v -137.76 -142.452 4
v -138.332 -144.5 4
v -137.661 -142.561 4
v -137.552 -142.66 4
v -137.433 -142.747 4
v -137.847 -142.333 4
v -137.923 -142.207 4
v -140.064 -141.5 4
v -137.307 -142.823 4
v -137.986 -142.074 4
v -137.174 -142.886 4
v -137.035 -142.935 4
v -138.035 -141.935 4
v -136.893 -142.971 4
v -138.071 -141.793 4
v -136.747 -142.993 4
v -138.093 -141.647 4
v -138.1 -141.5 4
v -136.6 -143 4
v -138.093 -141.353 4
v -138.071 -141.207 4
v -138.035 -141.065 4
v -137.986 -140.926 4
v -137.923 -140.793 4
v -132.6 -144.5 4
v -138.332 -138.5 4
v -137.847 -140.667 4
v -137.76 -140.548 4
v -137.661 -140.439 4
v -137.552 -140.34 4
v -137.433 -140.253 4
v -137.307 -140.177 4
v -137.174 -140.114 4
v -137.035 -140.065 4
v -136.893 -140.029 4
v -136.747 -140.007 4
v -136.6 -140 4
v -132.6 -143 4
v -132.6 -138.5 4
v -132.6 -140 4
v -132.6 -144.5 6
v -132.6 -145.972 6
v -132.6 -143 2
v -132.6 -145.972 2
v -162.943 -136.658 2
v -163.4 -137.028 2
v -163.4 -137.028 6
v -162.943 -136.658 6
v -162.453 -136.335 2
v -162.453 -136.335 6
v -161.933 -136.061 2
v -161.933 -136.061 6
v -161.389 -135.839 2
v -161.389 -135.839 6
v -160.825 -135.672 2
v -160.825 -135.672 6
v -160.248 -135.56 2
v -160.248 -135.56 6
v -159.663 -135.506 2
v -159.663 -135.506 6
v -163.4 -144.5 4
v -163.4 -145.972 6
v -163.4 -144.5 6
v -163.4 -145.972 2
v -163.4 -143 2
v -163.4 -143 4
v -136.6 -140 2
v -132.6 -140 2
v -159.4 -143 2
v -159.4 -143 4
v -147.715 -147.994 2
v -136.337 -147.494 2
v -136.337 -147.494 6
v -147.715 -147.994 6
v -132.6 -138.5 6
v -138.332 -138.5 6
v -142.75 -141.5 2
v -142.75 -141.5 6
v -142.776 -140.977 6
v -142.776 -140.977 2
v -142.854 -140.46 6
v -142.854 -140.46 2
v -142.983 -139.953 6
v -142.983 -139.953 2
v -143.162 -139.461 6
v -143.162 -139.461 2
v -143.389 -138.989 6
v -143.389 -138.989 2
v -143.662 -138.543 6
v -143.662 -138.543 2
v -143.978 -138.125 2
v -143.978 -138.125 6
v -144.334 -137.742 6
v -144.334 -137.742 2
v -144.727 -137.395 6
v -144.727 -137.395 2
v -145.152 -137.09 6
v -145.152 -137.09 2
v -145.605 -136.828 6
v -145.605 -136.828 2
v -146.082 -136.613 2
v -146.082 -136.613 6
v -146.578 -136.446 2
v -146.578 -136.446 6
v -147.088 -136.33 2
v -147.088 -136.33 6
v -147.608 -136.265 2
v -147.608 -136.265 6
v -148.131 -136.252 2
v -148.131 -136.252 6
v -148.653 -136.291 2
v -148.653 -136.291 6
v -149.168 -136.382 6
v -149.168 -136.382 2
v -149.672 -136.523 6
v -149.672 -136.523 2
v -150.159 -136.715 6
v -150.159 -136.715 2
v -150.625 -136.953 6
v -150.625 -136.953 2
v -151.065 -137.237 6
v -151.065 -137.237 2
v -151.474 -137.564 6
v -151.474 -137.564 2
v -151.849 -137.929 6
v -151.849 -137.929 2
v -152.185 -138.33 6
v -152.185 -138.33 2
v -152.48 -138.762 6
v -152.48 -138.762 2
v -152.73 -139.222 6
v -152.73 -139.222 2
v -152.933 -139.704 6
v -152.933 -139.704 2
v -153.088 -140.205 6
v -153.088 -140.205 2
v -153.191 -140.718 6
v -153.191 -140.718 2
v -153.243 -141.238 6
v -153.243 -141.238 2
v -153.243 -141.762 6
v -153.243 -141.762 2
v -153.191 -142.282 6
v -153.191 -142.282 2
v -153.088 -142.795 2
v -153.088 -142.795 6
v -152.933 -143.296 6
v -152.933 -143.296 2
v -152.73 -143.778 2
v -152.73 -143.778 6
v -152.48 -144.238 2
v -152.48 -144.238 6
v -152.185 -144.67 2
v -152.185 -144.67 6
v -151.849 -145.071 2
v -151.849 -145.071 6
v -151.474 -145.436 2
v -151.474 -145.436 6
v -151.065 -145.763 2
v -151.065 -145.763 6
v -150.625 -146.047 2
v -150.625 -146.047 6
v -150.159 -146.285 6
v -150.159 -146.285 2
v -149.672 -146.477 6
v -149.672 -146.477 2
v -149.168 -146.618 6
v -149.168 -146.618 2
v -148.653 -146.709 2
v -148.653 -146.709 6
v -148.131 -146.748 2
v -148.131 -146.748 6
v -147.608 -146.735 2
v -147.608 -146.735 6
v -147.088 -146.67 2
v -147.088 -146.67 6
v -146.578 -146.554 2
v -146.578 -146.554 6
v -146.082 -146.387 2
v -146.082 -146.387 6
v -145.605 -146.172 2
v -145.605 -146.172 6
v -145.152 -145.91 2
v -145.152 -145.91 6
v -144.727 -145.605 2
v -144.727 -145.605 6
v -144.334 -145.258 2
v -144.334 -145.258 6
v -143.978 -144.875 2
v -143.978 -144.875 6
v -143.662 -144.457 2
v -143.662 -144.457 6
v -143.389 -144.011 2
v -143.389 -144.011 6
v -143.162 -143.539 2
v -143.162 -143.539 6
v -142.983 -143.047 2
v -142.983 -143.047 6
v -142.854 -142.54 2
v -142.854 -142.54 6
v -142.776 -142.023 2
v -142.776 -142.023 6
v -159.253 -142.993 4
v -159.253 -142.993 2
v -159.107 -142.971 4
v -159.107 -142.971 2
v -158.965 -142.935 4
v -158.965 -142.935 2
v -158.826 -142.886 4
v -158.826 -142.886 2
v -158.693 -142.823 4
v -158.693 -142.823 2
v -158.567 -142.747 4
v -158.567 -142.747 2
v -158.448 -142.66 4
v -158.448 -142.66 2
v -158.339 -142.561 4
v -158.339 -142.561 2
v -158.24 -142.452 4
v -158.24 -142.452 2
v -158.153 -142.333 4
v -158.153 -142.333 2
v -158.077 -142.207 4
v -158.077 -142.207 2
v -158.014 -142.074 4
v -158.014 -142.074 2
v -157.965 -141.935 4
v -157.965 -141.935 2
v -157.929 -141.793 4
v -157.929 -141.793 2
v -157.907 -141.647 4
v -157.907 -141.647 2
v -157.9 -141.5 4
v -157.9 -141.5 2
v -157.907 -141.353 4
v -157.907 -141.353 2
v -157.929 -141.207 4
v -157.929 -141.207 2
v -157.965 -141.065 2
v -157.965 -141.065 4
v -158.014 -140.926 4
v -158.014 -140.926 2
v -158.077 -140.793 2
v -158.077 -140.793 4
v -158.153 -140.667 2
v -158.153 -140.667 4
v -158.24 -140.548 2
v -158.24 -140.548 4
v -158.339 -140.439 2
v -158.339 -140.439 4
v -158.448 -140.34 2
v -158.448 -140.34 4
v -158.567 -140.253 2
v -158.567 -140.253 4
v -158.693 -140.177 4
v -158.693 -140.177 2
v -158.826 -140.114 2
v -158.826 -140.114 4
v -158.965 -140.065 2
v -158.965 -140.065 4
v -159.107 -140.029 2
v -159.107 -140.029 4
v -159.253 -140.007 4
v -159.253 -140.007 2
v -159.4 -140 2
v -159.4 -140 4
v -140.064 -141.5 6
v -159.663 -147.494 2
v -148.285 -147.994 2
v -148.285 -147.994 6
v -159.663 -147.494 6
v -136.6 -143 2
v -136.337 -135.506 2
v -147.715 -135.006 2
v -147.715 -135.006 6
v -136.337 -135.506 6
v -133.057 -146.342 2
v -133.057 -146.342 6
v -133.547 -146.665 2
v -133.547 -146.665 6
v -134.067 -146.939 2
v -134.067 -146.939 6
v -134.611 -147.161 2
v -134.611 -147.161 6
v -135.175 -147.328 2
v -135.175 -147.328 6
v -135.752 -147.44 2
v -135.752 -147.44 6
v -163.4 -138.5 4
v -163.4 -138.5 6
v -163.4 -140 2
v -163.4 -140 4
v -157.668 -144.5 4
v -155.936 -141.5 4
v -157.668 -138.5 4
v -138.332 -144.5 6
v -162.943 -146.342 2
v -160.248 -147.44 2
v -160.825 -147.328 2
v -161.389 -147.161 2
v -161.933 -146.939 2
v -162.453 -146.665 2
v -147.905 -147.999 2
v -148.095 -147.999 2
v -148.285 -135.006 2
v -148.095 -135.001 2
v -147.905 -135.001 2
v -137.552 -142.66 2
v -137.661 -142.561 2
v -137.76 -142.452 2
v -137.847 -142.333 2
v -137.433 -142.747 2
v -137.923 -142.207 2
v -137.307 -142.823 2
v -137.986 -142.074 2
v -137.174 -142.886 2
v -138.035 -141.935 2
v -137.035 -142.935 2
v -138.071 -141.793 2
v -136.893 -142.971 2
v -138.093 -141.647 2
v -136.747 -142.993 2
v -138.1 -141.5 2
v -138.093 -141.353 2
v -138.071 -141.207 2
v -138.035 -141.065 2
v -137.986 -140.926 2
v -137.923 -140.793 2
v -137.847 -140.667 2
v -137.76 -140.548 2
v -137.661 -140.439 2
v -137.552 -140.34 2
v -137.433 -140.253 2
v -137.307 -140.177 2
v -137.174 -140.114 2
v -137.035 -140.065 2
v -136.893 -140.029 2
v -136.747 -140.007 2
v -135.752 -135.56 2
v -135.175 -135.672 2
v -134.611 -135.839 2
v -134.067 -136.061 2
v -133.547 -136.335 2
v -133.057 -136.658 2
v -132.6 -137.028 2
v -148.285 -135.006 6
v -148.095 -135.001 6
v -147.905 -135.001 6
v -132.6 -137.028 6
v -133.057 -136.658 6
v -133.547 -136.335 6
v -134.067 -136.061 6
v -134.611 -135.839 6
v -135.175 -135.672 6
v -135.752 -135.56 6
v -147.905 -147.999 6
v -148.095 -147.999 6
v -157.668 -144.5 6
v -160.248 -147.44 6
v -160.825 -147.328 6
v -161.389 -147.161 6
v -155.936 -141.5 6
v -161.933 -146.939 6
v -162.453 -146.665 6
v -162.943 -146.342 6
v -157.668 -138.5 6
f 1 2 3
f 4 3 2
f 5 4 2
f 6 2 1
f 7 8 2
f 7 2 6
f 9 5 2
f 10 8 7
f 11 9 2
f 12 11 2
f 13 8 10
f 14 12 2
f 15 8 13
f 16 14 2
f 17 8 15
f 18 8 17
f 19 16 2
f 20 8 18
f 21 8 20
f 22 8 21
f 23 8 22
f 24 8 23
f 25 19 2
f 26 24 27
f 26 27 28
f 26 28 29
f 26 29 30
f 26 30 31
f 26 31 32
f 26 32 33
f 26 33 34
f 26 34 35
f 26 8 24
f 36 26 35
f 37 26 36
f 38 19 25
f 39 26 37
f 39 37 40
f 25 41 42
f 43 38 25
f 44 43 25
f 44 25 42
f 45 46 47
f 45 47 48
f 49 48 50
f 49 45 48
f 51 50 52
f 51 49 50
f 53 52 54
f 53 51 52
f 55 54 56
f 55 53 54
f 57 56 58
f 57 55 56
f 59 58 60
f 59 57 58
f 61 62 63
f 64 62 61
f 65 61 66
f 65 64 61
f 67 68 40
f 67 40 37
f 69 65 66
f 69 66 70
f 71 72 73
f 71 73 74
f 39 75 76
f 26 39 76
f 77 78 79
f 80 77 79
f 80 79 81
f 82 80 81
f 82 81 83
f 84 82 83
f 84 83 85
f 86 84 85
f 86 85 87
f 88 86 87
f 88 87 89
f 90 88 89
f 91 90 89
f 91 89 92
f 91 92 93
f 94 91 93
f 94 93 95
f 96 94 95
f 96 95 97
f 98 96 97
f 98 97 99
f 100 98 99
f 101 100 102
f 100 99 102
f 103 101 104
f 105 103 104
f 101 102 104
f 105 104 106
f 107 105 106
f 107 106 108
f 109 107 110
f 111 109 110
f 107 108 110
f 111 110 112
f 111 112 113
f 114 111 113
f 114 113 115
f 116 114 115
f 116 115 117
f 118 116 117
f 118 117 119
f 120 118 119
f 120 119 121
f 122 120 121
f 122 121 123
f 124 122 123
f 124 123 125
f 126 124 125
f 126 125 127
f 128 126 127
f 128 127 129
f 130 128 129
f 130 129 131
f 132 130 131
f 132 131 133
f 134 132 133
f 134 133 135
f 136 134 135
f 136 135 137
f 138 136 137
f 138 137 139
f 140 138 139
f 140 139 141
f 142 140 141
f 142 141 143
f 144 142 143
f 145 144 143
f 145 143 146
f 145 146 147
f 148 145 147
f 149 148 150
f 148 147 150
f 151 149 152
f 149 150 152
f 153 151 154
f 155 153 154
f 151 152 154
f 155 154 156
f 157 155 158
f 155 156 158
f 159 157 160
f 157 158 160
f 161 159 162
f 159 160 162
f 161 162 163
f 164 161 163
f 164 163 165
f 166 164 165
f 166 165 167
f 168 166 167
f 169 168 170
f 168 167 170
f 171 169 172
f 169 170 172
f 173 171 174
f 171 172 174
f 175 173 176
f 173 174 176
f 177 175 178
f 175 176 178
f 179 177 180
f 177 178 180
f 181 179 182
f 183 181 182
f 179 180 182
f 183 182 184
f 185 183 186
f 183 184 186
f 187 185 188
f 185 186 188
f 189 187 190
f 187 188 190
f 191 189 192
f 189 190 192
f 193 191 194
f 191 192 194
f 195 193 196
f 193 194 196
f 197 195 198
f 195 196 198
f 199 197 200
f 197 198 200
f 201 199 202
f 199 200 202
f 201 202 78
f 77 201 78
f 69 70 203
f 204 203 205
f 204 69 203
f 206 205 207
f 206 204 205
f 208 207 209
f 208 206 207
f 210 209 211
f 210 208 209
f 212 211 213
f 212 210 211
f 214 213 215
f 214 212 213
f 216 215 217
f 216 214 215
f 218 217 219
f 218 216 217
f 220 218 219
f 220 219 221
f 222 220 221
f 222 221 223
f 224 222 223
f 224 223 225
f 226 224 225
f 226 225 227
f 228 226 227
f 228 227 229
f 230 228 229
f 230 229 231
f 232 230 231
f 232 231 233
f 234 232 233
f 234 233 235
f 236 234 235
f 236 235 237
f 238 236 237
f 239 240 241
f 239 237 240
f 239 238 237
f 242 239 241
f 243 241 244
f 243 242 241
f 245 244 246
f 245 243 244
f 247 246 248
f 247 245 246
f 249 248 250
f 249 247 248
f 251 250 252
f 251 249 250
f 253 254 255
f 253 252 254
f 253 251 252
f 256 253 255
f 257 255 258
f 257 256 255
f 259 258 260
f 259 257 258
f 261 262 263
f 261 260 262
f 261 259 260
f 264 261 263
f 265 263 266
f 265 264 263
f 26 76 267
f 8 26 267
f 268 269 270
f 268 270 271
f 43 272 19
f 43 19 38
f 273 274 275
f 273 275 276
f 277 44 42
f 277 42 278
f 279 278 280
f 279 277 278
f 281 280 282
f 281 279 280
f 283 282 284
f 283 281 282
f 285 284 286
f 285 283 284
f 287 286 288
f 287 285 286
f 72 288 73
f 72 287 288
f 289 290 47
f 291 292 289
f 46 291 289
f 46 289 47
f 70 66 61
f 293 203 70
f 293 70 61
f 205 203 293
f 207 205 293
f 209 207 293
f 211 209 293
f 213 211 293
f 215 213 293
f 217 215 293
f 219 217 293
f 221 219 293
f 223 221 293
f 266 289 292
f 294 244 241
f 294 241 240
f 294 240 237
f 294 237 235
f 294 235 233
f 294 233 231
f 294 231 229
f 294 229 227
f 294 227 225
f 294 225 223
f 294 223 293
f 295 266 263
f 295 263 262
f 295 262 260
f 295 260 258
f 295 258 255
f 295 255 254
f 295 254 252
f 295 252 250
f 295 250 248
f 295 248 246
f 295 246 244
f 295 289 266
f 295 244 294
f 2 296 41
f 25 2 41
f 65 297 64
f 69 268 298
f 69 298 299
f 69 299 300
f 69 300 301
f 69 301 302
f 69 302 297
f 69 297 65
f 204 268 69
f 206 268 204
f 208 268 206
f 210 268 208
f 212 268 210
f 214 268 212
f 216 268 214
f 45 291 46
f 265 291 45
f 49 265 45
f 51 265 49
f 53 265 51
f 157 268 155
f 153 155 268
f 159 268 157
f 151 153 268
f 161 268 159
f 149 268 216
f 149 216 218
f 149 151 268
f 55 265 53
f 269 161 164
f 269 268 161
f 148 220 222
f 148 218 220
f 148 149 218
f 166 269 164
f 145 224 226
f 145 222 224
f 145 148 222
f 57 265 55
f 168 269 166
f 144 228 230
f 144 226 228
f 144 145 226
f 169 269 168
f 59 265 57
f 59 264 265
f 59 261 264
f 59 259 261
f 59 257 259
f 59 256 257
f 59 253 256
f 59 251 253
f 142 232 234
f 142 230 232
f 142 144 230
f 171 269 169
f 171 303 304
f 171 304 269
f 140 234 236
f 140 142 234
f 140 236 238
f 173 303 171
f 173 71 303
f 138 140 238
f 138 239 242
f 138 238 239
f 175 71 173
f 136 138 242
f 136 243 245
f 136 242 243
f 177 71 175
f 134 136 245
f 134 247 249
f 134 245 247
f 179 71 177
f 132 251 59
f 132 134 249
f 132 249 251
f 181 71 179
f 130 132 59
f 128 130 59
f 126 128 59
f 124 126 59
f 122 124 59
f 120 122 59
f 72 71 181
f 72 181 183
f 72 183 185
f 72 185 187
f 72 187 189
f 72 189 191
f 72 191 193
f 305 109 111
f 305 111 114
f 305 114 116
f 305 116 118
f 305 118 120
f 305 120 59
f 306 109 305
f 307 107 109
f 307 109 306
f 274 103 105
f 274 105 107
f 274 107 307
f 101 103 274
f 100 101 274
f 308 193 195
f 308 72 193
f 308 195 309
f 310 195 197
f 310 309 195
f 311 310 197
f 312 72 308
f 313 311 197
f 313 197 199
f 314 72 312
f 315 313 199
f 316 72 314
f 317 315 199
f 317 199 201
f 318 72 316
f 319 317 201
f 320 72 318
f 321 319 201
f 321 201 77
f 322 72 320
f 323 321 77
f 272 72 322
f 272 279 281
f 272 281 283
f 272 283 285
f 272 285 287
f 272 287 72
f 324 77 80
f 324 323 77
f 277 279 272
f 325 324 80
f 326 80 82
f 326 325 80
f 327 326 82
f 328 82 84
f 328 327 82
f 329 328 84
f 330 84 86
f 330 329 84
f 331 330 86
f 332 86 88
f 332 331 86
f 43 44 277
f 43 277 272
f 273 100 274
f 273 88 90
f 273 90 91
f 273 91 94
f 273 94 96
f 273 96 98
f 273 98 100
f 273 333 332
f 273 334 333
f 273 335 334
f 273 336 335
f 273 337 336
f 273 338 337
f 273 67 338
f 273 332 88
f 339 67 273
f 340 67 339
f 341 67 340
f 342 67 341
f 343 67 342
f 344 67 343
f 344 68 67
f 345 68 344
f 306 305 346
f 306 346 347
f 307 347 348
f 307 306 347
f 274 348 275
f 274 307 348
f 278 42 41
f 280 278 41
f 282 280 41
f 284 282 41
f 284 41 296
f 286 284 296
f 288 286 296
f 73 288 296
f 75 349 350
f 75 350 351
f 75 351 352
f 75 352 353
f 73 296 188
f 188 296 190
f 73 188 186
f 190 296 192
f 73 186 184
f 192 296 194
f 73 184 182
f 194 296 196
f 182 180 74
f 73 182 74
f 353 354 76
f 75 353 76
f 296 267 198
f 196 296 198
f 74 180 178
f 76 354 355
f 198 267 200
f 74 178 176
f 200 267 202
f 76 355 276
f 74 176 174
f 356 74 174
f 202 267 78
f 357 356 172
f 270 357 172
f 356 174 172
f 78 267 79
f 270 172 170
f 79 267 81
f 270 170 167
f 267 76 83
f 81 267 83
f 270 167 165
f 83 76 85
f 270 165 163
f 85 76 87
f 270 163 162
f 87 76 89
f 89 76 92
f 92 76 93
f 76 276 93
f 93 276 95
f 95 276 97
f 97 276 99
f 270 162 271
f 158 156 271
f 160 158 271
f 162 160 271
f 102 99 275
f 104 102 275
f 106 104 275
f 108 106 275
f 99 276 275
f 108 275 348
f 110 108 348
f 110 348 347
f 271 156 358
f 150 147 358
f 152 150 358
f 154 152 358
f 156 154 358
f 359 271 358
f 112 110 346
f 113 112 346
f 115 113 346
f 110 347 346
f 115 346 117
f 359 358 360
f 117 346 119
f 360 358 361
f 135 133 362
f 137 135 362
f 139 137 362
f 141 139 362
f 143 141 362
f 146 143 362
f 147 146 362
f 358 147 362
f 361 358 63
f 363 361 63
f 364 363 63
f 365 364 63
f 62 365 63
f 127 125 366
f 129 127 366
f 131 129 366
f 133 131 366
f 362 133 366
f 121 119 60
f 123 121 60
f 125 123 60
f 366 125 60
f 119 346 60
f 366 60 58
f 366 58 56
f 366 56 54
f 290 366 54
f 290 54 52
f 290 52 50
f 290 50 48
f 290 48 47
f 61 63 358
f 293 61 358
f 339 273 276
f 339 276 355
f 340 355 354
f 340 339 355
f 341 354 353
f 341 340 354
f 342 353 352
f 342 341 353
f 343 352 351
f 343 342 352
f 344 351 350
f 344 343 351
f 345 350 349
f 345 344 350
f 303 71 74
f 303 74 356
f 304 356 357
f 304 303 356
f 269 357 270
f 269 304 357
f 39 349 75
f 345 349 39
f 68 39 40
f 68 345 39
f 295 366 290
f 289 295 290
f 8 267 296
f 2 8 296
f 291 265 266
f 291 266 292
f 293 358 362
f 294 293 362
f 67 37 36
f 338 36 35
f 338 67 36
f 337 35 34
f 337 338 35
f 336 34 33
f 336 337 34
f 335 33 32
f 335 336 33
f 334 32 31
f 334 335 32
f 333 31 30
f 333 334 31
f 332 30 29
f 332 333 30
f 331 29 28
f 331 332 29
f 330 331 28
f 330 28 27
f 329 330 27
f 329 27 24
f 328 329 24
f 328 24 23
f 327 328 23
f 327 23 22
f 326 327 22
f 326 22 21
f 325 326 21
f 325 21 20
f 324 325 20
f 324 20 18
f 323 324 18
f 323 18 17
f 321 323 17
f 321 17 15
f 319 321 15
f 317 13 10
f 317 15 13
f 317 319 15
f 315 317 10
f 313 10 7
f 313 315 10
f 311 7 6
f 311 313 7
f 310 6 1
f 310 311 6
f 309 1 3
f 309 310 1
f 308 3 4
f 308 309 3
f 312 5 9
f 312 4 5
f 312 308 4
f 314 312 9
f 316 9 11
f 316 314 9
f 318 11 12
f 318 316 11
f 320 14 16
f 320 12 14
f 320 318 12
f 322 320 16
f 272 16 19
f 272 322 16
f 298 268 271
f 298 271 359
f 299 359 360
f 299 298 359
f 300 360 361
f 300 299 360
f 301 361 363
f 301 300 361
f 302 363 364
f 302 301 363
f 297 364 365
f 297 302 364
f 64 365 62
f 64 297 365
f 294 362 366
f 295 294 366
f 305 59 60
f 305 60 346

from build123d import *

# Parameters (mm, degrees)
EXTRUDE_1_DEPTH     = 6
SKETCH_2_R          = 5.25
CUT_EXTRUDE_1_DEPTH = 10
CUT_EXTRUDE_2_DEPTH = 2
SKETCH_4_W          = 2
SKETCH_4_H          = 14.987490134
CUT_EXTRUDE_3_DEPTH = 31.8


with BuildPart() as part:
    # Эскиз1 → Бобышка-Вытянуть1 (new body)
    with BuildSketch(Plane.XY):
        with BuildLine():
            Line((-136.336842105, -147.494226215), (-147.714912281, -147.993745067))
            ThreePointArc((-147.714912281, -147.993745067), (-148, -148), (-148.285087719, -147.993745067))
            Line((-148.285087719, -147.993745067), (-159.663157895, -147.494226215))
            ThreePointArc((-159.663157895, -147.494226215), (-161.66336442, -147.05672399), (-163.4, -145.972135955))
            Line((-163.4, -145.972135955), (-163.4, -143))
            Line((-163.4, -143), (-159.4, -143))
            ThreePointArc((-159.4, -143), (-157.9, -141.5), (-159.4, -140))
            Line((-159.4, -140), (-163.4, -140))
            Line((-163.4, -140), (-163.4, -137.027864045))
            ThreePointArc((-163.4, -137.027864045), (-161.66336442, -135.94327601), (-159.663157895, -135.505773785))
            Line((-159.663157895, -135.505773785), (-148.285087719, -135.006254933))
            ThreePointArc((-148.285087719, -135.006254933), (-148, -135), (-147.714912281, -135.006254933))
            Line((-147.714912281, -135.006254933), (-136.336842105, -135.505773785))
            ThreePointArc((-136.336842105, -135.505773785), (-134.33663558, -135.94327601), (-132.6, -137.027864045))
            Line((-132.6, -137.027864045), (-132.6, -140))
            Line((-132.6, -140), (-136.6, -140))
            ThreePointArc((-136.6, -140), (-138.1, -141.5), (-136.6, -143))
            Line((-136.6, -143), (-132.6, -143))
            Line((-132.6, -143), (-132.6, -145.972135955))
            ThreePointArc((-132.6, -145.972135955), (-134.33663558, -147.05672399), (-136.336842105, -147.494226215))
        make_face()
    extrude(amount=EXTRUDE_1_DEPTH)

    # Эскиз2 → Вырез-Вытянуть1 (cut)
    with BuildSketch(Plane.XY.offset(6)):
        with Locations((-148, -141.5)):
            Circle(SKETCH_2_R)
    extrude(amount=-CUT_EXTRUDE_1_DEPTH, mode=Mode.SUBTRACT)

    # Эскиз3 → Вырез-Вытянуть2 (cut)
    with BuildSketch(Plane.XY.offset(6)):
        Polygon((-132.6, -138.5), (-134.867949192, -138.5), (-134.001923789, -140), (-132.6, -140), align=None)
        with BuildLine():
            Line((-134.001923789, -140), (-134.867949192, -138.5))
            Line((-134.867949192, -138.5), (-138.332050808, -138.5))
            Line((-138.332050808, -138.5), (-140.064101615, -141.5))
            Line((-140.064101615, -141.5), (-138.332050808, -144.5))
            Line((-138.332050808, -144.5), (-134.867949192, -144.5))
            Line((-134.867949192, -144.5), (-134.001923789, -143))
            Line((-134.001923789, -143), (-136.6, -143))
            ThreePointArc((-136.6, -143), (-138.1, -141.5), (-136.6, -140))
            Line((-136.6, -140), (-134.001923789, -140))
        make_face()
        Polygon((-132.6, -143), (-134.001923789, -143), (-134.867949192, -144.5), (-132.6, -144.5), align=None)
        with BuildLine():
            Line((-157.667949192, -138.5), (-161.132050808, -138.5))
            Line((-161.132050808, -138.5), (-161.998076211, -140))
            Line((-161.998076211, -140), (-159.4, -140))
            ThreePointArc((-159.4, -140), (-157.9, -141.5), (-159.4, -143))
            Line((-159.4, -143), (-161.998076211, -143))
            Line((-161.998076211, -143), (-161.132050808, -144.5))
            Line((-161.132050808, -144.5), (-157.667949192, -144.5))
            Line((-157.667949192, -144.5), (-155.935898385, -141.5))
            Line((-155.935898385, -141.5), (-157.667949192, -138.5))
        make_face()
        Polygon((-161.998076211, -140), (-161.132050808, -138.5), (-163.4, -138.5), (-163.4, -140), align=None)
        Polygon((-161.998076211, -143), (-163.4, -143), (-163.4, -144.5), (-161.132050808, -144.5), align=None)
    extrude(amount=-CUT_EXTRUDE_2_DEPTH, mode=Mode.SUBTRACT)

    # Эскиз4 → Вырез-Вытянуть3 (cut, through all)
    with BuildSketch(Plane(origin=(-132.6, 0, 0), x_dir=(0, 0, -1), z_dir=(1, 0, 0))):
        with Locations((-1, -141.5)):
            Rectangle(SKETCH_4_W, SKETCH_4_H)
    extrude(amount=-CUT_EXTRUDE_3_DEPTH, mode=Mode.SUBTRACT)


solid = part.part
